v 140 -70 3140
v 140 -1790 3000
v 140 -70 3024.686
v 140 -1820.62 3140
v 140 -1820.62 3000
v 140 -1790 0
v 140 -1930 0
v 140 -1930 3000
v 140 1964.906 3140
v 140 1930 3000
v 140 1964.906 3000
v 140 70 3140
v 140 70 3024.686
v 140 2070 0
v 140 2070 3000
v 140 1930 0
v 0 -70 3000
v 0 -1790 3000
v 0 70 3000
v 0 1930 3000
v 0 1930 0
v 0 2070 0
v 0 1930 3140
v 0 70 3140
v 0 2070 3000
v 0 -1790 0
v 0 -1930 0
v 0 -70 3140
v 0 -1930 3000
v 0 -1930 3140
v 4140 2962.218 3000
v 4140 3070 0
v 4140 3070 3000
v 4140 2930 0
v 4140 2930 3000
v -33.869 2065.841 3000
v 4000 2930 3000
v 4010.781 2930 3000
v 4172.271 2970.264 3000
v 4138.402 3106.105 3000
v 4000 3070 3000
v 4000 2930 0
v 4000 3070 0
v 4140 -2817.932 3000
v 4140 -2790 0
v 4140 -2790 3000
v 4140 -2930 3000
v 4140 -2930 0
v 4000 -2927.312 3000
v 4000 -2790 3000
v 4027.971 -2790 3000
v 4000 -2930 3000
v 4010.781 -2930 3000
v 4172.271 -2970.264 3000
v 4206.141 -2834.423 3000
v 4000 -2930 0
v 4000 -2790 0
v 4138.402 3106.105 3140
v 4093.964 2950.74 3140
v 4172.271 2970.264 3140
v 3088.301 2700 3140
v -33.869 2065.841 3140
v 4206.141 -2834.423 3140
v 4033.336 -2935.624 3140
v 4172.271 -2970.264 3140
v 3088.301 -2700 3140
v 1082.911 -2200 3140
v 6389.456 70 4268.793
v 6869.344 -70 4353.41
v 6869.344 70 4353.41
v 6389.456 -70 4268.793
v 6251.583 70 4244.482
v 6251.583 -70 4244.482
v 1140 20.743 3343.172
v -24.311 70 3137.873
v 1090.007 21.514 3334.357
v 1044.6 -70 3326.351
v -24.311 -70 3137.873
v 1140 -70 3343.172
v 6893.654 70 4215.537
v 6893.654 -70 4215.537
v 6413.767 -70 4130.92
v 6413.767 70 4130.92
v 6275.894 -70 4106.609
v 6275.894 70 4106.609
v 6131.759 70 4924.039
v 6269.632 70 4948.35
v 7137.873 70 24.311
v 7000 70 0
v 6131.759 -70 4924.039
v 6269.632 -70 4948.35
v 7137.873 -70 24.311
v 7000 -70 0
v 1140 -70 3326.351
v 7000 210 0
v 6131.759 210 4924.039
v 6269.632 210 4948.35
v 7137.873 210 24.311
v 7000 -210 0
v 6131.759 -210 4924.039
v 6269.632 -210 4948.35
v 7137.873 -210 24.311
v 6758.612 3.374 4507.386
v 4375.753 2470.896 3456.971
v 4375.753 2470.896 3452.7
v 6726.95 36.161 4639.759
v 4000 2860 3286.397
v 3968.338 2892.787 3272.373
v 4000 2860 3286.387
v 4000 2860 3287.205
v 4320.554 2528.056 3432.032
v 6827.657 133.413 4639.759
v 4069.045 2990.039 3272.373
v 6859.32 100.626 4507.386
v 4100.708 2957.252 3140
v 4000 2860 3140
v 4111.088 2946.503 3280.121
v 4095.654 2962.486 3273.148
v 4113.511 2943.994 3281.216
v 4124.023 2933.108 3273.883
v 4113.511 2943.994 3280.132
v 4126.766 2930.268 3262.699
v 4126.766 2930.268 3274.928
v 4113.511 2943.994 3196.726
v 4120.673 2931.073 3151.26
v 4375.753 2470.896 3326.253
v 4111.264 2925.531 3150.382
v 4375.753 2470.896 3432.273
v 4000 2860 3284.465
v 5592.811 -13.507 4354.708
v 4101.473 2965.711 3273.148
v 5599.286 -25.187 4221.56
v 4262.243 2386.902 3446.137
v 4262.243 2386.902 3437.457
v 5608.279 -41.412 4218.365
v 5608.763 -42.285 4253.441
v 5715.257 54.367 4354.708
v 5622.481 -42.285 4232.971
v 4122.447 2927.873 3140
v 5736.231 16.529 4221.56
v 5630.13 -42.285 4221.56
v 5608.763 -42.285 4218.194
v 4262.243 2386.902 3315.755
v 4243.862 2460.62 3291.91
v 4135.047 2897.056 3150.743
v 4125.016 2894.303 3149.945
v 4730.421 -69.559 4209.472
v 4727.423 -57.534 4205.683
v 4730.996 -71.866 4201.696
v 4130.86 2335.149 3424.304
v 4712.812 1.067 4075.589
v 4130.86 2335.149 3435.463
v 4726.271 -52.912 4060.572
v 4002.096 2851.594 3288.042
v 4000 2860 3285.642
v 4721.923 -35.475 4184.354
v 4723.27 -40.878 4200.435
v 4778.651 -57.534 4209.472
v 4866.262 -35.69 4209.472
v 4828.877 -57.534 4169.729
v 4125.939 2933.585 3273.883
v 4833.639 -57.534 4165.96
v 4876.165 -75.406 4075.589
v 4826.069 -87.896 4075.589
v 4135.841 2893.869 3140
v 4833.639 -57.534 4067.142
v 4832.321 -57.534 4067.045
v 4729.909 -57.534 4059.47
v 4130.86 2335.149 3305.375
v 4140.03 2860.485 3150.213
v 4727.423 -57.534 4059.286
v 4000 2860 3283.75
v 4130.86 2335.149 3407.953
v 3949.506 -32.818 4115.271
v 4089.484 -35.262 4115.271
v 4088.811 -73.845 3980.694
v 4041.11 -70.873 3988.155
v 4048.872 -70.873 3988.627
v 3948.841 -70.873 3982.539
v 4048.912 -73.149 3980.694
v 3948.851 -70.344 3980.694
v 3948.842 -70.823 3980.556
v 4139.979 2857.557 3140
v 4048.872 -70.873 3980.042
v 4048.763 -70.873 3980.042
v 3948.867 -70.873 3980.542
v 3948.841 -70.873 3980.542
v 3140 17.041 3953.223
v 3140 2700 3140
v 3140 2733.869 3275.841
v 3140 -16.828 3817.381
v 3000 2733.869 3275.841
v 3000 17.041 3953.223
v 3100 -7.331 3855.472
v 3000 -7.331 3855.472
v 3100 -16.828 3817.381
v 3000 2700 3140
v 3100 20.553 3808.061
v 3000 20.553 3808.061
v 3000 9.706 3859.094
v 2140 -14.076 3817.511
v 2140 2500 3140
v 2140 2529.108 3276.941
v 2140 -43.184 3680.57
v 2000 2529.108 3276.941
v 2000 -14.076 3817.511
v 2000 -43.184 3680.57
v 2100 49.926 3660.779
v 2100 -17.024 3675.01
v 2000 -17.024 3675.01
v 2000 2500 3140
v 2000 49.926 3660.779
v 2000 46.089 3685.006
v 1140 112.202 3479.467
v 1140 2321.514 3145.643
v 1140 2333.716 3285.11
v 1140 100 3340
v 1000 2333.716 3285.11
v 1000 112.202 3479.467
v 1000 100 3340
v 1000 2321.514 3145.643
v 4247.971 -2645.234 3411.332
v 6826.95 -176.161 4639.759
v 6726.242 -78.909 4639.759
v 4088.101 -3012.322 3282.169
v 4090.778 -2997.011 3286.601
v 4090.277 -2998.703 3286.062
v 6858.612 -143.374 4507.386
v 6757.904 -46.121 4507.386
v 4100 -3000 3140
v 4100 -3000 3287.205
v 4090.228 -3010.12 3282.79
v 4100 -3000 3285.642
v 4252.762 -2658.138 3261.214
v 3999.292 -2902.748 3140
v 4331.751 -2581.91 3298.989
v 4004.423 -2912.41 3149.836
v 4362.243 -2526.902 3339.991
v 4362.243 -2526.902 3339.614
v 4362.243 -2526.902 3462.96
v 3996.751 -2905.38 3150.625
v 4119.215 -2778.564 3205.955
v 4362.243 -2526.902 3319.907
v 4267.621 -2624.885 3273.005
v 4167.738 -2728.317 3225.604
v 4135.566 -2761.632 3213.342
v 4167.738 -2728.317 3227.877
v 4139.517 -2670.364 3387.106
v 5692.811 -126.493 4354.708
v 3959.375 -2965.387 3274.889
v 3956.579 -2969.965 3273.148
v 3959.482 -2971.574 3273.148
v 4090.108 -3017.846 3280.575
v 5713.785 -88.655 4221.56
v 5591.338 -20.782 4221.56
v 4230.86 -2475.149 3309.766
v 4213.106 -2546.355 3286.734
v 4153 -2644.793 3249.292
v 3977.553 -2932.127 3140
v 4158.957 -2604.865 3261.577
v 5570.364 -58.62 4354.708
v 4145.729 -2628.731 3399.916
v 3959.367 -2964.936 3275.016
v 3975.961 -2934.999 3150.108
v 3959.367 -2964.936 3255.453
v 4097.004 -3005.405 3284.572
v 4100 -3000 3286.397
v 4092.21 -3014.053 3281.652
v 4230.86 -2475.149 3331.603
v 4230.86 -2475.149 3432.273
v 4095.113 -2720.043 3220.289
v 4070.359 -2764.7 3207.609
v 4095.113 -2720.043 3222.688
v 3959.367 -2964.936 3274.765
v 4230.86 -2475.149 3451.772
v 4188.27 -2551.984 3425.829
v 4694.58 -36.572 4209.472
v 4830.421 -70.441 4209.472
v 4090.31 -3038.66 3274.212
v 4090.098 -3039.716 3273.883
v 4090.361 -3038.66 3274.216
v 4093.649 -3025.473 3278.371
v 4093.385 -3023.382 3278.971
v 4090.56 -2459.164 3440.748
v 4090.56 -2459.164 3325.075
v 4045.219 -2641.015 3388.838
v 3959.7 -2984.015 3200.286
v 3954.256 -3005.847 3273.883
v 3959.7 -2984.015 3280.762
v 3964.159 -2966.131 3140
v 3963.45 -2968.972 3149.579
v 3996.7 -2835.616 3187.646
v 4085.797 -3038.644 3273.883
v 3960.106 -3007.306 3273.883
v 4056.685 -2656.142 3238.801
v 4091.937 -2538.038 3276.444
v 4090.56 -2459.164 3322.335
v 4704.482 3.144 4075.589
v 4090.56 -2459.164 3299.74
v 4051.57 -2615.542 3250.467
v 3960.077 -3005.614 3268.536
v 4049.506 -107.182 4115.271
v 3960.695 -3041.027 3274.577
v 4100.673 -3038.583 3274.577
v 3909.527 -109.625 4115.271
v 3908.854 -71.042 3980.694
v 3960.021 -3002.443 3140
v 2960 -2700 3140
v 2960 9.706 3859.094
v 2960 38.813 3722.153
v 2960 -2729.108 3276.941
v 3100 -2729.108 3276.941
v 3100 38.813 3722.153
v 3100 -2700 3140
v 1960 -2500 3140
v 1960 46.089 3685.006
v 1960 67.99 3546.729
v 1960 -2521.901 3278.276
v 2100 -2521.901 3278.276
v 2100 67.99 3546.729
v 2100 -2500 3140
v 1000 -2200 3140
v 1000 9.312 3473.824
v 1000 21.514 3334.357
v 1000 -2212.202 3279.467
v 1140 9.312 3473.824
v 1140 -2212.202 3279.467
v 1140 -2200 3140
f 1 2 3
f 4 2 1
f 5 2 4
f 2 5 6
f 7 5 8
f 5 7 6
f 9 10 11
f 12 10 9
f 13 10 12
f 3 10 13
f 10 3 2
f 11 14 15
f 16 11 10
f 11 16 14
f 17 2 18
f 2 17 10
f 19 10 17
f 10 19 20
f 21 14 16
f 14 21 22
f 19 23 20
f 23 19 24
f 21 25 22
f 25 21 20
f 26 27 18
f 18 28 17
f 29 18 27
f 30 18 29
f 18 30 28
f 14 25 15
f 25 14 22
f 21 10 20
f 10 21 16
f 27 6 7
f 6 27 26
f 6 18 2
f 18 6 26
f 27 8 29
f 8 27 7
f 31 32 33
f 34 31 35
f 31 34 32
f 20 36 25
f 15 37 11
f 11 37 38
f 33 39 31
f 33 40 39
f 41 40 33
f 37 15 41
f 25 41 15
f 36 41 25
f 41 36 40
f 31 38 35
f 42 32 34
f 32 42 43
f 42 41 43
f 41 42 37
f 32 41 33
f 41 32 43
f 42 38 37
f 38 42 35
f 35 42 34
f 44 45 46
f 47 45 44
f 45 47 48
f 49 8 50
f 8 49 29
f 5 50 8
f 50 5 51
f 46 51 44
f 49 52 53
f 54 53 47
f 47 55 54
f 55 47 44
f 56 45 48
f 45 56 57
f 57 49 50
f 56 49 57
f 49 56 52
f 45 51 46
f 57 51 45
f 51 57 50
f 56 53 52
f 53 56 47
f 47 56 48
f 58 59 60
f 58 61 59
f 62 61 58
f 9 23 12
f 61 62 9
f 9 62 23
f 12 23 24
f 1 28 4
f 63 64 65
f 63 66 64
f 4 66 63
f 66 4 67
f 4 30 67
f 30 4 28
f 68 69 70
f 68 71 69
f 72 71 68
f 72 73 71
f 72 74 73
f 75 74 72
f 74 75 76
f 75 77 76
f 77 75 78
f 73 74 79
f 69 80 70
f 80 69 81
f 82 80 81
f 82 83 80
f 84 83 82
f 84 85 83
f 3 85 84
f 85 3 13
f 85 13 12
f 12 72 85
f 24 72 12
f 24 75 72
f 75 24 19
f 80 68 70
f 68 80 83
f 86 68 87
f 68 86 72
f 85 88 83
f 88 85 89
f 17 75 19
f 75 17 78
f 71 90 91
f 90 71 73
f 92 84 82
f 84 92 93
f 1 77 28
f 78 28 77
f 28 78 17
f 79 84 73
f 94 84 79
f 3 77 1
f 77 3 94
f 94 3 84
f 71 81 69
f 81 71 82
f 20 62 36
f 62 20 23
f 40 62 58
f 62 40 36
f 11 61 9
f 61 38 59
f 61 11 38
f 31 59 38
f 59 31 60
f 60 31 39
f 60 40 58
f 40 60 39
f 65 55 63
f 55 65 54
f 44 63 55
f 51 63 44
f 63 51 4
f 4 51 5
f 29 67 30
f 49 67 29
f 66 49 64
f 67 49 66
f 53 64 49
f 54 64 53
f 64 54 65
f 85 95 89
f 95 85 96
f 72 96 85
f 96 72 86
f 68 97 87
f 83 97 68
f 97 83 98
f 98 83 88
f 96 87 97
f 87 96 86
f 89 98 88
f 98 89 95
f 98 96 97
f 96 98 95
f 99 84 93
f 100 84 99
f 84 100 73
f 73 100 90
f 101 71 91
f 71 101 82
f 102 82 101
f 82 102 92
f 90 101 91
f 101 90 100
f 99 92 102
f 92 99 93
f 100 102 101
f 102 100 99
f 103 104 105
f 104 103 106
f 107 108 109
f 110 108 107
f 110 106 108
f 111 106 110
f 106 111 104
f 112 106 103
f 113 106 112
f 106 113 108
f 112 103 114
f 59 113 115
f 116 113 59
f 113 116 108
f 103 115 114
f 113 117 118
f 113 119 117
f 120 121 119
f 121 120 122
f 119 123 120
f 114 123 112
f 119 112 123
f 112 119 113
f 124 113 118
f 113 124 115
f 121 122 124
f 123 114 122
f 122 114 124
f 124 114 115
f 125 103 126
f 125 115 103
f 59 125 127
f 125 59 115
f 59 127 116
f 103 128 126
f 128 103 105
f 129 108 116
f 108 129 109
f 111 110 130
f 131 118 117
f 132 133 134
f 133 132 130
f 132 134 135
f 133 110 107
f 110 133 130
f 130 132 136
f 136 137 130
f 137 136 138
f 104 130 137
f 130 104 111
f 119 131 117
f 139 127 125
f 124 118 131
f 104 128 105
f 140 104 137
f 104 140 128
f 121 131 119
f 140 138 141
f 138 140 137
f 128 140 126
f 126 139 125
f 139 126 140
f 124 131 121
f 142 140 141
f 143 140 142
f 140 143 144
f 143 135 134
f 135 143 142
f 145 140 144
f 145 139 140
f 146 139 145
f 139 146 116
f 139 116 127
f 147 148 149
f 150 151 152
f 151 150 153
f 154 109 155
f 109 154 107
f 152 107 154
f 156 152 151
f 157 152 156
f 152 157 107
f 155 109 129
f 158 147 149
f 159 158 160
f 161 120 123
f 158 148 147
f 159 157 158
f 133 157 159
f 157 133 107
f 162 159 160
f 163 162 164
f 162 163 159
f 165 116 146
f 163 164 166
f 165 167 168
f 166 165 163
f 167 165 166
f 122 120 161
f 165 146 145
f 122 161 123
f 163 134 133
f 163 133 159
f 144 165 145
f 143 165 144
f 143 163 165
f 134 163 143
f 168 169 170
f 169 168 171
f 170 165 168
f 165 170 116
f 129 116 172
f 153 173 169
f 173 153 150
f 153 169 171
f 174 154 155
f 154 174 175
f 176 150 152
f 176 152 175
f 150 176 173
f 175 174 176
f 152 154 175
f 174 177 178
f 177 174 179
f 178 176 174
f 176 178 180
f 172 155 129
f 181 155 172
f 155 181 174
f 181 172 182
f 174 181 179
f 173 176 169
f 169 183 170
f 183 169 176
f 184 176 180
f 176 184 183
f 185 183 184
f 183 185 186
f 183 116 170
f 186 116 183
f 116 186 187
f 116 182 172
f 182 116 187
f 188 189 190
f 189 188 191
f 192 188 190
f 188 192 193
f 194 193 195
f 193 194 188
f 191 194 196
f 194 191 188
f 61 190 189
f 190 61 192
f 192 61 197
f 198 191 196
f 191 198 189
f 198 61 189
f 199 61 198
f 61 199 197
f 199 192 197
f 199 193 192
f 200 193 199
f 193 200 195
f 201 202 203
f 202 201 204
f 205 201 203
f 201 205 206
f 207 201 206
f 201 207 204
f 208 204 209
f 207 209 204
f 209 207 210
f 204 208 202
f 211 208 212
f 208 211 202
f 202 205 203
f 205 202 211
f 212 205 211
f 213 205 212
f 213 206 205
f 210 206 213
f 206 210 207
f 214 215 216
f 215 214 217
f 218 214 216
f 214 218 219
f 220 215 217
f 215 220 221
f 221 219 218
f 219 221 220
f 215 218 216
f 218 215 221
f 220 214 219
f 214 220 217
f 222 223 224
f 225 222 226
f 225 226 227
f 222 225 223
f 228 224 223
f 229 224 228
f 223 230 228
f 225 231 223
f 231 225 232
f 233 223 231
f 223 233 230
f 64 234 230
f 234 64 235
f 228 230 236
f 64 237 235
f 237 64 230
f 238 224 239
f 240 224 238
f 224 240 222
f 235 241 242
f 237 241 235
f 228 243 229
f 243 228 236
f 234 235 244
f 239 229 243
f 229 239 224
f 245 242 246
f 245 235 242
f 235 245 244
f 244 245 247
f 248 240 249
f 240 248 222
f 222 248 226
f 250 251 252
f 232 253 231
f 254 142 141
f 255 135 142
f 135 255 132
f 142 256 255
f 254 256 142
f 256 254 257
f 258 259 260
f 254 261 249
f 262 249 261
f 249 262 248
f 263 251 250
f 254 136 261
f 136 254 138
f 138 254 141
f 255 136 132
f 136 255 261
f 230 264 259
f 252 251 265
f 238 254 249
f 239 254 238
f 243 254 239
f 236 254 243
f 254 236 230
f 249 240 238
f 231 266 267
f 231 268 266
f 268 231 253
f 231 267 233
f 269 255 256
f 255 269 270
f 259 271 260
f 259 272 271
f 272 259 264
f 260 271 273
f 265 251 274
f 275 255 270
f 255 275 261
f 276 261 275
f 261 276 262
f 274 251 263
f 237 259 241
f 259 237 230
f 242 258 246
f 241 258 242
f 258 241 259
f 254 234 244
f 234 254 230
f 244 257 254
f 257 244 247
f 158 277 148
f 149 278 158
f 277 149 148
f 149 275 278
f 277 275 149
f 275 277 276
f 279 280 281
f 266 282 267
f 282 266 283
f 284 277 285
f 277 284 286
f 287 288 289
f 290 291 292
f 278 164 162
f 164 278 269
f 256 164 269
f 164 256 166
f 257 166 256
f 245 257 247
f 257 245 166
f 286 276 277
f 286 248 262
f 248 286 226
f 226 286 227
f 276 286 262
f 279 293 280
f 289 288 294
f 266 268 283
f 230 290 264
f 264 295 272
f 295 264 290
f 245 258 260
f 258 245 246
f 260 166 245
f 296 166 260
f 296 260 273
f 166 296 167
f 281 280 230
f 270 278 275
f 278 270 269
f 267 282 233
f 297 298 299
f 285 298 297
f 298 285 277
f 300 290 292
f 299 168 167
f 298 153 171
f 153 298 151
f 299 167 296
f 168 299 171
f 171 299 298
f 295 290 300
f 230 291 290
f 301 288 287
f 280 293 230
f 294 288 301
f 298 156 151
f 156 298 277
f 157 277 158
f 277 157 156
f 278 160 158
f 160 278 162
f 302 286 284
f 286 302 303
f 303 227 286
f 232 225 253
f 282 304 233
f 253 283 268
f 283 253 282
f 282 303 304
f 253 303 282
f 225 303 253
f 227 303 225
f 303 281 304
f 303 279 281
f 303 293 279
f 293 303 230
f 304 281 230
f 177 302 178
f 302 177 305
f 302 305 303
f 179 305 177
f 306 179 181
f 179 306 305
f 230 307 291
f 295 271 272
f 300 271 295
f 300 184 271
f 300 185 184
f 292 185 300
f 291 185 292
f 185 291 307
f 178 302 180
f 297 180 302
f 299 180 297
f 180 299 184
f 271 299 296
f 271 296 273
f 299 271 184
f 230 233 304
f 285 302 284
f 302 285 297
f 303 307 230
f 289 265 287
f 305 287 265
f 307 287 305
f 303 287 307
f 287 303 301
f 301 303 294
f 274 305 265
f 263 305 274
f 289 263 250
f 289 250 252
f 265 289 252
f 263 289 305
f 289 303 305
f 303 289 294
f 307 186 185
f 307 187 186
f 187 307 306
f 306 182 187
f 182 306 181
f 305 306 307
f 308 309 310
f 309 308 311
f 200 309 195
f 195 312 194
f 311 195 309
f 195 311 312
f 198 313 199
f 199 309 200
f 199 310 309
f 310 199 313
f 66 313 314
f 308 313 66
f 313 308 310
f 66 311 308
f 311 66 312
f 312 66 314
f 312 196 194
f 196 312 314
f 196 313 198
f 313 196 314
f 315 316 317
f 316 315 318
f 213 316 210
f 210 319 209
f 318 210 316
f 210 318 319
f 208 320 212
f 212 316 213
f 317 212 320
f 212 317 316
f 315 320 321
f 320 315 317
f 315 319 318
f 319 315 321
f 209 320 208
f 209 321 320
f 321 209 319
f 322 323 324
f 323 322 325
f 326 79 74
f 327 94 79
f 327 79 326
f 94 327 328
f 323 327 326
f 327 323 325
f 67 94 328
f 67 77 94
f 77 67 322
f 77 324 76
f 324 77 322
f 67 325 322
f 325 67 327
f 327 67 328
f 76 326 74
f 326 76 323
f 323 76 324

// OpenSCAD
translate([0, 1930, 0]) cube([140,140,3000]);
translate([0, -1930, 0]) cube([140,140,3000]);
translate([4000, 2930, 0]) cube([140,140,3000]);
translate([4000, -2930, 0]) cube([140,140,3000]);
translate([0, -1930, 3000]) cube([140, 4000, 140]);
translate([0, -70, 3000]) rotate([0, -10, 0]) cube([7000,140,140]);

translate([0, 1930, 3000]) rotate([0, 0, 14]) cube([4300, 140, 140]);
translate([0, -1930, 3000]) rotate([0, 0, -14]) cube([4300, 140, 140]);

// Front
translate([7000, 70, 0]) rotate([0, -10, 0]) cube([140,140,5000]);
translate([7000, -210, 0]) rotate([0, -10, 0]) cube([140,140,5000]);

// Left
translate([4000, 2860, 3140]) rotate([0, -19, -46]) cube([4200,140,140]);
translate([4000, 2860, 3140]) rotate([0, -18, -61]) cube([3500,140,140]);
translate([4000, 2860, 3140]) rotate([0, -17, -76]) cube([3200,140,140]);
translate([4000, 2860, 3140]) rotate([0, -16, -91]) cube([3050,140,140]);

translate([3000, 2700, 3140]) rotate([0, -14, -90]) cube([2800,140,140]);
translate([2000, 2500, 3140]) rotate([0, -12, -90]) cube([2600,140,140]);
translate([1000, 100, 3340]) rotate([-5, 0, 0]) cube([140, 2230,140]);

// Right
translate([4100, -3000, 3140]) rotate([0, -19, 46]) cube([4200,140,140]);
translate([4100, -3000, 3140]) rotate([0, -18, 61]) cube([3500,140,140]);
translate([4100, -3000, 3140]) rotate([0, -17, 76]) cube([3200,140,140]);
translate([4100, -3000, 3140]) rotate([0, -16, 91]) cube([3050,140,140]);

translate([3100, -2700, 3140]) rotate([0, -12, 90]) cube([2800,140,140]);
translate([2100, -2500, 3140]) rotate([0, -9, 90]) cube([2600,140,140]);
translate([1000, -2200, 3140]) rotate([5, 0, 0]) cube([140,2230,140]);
